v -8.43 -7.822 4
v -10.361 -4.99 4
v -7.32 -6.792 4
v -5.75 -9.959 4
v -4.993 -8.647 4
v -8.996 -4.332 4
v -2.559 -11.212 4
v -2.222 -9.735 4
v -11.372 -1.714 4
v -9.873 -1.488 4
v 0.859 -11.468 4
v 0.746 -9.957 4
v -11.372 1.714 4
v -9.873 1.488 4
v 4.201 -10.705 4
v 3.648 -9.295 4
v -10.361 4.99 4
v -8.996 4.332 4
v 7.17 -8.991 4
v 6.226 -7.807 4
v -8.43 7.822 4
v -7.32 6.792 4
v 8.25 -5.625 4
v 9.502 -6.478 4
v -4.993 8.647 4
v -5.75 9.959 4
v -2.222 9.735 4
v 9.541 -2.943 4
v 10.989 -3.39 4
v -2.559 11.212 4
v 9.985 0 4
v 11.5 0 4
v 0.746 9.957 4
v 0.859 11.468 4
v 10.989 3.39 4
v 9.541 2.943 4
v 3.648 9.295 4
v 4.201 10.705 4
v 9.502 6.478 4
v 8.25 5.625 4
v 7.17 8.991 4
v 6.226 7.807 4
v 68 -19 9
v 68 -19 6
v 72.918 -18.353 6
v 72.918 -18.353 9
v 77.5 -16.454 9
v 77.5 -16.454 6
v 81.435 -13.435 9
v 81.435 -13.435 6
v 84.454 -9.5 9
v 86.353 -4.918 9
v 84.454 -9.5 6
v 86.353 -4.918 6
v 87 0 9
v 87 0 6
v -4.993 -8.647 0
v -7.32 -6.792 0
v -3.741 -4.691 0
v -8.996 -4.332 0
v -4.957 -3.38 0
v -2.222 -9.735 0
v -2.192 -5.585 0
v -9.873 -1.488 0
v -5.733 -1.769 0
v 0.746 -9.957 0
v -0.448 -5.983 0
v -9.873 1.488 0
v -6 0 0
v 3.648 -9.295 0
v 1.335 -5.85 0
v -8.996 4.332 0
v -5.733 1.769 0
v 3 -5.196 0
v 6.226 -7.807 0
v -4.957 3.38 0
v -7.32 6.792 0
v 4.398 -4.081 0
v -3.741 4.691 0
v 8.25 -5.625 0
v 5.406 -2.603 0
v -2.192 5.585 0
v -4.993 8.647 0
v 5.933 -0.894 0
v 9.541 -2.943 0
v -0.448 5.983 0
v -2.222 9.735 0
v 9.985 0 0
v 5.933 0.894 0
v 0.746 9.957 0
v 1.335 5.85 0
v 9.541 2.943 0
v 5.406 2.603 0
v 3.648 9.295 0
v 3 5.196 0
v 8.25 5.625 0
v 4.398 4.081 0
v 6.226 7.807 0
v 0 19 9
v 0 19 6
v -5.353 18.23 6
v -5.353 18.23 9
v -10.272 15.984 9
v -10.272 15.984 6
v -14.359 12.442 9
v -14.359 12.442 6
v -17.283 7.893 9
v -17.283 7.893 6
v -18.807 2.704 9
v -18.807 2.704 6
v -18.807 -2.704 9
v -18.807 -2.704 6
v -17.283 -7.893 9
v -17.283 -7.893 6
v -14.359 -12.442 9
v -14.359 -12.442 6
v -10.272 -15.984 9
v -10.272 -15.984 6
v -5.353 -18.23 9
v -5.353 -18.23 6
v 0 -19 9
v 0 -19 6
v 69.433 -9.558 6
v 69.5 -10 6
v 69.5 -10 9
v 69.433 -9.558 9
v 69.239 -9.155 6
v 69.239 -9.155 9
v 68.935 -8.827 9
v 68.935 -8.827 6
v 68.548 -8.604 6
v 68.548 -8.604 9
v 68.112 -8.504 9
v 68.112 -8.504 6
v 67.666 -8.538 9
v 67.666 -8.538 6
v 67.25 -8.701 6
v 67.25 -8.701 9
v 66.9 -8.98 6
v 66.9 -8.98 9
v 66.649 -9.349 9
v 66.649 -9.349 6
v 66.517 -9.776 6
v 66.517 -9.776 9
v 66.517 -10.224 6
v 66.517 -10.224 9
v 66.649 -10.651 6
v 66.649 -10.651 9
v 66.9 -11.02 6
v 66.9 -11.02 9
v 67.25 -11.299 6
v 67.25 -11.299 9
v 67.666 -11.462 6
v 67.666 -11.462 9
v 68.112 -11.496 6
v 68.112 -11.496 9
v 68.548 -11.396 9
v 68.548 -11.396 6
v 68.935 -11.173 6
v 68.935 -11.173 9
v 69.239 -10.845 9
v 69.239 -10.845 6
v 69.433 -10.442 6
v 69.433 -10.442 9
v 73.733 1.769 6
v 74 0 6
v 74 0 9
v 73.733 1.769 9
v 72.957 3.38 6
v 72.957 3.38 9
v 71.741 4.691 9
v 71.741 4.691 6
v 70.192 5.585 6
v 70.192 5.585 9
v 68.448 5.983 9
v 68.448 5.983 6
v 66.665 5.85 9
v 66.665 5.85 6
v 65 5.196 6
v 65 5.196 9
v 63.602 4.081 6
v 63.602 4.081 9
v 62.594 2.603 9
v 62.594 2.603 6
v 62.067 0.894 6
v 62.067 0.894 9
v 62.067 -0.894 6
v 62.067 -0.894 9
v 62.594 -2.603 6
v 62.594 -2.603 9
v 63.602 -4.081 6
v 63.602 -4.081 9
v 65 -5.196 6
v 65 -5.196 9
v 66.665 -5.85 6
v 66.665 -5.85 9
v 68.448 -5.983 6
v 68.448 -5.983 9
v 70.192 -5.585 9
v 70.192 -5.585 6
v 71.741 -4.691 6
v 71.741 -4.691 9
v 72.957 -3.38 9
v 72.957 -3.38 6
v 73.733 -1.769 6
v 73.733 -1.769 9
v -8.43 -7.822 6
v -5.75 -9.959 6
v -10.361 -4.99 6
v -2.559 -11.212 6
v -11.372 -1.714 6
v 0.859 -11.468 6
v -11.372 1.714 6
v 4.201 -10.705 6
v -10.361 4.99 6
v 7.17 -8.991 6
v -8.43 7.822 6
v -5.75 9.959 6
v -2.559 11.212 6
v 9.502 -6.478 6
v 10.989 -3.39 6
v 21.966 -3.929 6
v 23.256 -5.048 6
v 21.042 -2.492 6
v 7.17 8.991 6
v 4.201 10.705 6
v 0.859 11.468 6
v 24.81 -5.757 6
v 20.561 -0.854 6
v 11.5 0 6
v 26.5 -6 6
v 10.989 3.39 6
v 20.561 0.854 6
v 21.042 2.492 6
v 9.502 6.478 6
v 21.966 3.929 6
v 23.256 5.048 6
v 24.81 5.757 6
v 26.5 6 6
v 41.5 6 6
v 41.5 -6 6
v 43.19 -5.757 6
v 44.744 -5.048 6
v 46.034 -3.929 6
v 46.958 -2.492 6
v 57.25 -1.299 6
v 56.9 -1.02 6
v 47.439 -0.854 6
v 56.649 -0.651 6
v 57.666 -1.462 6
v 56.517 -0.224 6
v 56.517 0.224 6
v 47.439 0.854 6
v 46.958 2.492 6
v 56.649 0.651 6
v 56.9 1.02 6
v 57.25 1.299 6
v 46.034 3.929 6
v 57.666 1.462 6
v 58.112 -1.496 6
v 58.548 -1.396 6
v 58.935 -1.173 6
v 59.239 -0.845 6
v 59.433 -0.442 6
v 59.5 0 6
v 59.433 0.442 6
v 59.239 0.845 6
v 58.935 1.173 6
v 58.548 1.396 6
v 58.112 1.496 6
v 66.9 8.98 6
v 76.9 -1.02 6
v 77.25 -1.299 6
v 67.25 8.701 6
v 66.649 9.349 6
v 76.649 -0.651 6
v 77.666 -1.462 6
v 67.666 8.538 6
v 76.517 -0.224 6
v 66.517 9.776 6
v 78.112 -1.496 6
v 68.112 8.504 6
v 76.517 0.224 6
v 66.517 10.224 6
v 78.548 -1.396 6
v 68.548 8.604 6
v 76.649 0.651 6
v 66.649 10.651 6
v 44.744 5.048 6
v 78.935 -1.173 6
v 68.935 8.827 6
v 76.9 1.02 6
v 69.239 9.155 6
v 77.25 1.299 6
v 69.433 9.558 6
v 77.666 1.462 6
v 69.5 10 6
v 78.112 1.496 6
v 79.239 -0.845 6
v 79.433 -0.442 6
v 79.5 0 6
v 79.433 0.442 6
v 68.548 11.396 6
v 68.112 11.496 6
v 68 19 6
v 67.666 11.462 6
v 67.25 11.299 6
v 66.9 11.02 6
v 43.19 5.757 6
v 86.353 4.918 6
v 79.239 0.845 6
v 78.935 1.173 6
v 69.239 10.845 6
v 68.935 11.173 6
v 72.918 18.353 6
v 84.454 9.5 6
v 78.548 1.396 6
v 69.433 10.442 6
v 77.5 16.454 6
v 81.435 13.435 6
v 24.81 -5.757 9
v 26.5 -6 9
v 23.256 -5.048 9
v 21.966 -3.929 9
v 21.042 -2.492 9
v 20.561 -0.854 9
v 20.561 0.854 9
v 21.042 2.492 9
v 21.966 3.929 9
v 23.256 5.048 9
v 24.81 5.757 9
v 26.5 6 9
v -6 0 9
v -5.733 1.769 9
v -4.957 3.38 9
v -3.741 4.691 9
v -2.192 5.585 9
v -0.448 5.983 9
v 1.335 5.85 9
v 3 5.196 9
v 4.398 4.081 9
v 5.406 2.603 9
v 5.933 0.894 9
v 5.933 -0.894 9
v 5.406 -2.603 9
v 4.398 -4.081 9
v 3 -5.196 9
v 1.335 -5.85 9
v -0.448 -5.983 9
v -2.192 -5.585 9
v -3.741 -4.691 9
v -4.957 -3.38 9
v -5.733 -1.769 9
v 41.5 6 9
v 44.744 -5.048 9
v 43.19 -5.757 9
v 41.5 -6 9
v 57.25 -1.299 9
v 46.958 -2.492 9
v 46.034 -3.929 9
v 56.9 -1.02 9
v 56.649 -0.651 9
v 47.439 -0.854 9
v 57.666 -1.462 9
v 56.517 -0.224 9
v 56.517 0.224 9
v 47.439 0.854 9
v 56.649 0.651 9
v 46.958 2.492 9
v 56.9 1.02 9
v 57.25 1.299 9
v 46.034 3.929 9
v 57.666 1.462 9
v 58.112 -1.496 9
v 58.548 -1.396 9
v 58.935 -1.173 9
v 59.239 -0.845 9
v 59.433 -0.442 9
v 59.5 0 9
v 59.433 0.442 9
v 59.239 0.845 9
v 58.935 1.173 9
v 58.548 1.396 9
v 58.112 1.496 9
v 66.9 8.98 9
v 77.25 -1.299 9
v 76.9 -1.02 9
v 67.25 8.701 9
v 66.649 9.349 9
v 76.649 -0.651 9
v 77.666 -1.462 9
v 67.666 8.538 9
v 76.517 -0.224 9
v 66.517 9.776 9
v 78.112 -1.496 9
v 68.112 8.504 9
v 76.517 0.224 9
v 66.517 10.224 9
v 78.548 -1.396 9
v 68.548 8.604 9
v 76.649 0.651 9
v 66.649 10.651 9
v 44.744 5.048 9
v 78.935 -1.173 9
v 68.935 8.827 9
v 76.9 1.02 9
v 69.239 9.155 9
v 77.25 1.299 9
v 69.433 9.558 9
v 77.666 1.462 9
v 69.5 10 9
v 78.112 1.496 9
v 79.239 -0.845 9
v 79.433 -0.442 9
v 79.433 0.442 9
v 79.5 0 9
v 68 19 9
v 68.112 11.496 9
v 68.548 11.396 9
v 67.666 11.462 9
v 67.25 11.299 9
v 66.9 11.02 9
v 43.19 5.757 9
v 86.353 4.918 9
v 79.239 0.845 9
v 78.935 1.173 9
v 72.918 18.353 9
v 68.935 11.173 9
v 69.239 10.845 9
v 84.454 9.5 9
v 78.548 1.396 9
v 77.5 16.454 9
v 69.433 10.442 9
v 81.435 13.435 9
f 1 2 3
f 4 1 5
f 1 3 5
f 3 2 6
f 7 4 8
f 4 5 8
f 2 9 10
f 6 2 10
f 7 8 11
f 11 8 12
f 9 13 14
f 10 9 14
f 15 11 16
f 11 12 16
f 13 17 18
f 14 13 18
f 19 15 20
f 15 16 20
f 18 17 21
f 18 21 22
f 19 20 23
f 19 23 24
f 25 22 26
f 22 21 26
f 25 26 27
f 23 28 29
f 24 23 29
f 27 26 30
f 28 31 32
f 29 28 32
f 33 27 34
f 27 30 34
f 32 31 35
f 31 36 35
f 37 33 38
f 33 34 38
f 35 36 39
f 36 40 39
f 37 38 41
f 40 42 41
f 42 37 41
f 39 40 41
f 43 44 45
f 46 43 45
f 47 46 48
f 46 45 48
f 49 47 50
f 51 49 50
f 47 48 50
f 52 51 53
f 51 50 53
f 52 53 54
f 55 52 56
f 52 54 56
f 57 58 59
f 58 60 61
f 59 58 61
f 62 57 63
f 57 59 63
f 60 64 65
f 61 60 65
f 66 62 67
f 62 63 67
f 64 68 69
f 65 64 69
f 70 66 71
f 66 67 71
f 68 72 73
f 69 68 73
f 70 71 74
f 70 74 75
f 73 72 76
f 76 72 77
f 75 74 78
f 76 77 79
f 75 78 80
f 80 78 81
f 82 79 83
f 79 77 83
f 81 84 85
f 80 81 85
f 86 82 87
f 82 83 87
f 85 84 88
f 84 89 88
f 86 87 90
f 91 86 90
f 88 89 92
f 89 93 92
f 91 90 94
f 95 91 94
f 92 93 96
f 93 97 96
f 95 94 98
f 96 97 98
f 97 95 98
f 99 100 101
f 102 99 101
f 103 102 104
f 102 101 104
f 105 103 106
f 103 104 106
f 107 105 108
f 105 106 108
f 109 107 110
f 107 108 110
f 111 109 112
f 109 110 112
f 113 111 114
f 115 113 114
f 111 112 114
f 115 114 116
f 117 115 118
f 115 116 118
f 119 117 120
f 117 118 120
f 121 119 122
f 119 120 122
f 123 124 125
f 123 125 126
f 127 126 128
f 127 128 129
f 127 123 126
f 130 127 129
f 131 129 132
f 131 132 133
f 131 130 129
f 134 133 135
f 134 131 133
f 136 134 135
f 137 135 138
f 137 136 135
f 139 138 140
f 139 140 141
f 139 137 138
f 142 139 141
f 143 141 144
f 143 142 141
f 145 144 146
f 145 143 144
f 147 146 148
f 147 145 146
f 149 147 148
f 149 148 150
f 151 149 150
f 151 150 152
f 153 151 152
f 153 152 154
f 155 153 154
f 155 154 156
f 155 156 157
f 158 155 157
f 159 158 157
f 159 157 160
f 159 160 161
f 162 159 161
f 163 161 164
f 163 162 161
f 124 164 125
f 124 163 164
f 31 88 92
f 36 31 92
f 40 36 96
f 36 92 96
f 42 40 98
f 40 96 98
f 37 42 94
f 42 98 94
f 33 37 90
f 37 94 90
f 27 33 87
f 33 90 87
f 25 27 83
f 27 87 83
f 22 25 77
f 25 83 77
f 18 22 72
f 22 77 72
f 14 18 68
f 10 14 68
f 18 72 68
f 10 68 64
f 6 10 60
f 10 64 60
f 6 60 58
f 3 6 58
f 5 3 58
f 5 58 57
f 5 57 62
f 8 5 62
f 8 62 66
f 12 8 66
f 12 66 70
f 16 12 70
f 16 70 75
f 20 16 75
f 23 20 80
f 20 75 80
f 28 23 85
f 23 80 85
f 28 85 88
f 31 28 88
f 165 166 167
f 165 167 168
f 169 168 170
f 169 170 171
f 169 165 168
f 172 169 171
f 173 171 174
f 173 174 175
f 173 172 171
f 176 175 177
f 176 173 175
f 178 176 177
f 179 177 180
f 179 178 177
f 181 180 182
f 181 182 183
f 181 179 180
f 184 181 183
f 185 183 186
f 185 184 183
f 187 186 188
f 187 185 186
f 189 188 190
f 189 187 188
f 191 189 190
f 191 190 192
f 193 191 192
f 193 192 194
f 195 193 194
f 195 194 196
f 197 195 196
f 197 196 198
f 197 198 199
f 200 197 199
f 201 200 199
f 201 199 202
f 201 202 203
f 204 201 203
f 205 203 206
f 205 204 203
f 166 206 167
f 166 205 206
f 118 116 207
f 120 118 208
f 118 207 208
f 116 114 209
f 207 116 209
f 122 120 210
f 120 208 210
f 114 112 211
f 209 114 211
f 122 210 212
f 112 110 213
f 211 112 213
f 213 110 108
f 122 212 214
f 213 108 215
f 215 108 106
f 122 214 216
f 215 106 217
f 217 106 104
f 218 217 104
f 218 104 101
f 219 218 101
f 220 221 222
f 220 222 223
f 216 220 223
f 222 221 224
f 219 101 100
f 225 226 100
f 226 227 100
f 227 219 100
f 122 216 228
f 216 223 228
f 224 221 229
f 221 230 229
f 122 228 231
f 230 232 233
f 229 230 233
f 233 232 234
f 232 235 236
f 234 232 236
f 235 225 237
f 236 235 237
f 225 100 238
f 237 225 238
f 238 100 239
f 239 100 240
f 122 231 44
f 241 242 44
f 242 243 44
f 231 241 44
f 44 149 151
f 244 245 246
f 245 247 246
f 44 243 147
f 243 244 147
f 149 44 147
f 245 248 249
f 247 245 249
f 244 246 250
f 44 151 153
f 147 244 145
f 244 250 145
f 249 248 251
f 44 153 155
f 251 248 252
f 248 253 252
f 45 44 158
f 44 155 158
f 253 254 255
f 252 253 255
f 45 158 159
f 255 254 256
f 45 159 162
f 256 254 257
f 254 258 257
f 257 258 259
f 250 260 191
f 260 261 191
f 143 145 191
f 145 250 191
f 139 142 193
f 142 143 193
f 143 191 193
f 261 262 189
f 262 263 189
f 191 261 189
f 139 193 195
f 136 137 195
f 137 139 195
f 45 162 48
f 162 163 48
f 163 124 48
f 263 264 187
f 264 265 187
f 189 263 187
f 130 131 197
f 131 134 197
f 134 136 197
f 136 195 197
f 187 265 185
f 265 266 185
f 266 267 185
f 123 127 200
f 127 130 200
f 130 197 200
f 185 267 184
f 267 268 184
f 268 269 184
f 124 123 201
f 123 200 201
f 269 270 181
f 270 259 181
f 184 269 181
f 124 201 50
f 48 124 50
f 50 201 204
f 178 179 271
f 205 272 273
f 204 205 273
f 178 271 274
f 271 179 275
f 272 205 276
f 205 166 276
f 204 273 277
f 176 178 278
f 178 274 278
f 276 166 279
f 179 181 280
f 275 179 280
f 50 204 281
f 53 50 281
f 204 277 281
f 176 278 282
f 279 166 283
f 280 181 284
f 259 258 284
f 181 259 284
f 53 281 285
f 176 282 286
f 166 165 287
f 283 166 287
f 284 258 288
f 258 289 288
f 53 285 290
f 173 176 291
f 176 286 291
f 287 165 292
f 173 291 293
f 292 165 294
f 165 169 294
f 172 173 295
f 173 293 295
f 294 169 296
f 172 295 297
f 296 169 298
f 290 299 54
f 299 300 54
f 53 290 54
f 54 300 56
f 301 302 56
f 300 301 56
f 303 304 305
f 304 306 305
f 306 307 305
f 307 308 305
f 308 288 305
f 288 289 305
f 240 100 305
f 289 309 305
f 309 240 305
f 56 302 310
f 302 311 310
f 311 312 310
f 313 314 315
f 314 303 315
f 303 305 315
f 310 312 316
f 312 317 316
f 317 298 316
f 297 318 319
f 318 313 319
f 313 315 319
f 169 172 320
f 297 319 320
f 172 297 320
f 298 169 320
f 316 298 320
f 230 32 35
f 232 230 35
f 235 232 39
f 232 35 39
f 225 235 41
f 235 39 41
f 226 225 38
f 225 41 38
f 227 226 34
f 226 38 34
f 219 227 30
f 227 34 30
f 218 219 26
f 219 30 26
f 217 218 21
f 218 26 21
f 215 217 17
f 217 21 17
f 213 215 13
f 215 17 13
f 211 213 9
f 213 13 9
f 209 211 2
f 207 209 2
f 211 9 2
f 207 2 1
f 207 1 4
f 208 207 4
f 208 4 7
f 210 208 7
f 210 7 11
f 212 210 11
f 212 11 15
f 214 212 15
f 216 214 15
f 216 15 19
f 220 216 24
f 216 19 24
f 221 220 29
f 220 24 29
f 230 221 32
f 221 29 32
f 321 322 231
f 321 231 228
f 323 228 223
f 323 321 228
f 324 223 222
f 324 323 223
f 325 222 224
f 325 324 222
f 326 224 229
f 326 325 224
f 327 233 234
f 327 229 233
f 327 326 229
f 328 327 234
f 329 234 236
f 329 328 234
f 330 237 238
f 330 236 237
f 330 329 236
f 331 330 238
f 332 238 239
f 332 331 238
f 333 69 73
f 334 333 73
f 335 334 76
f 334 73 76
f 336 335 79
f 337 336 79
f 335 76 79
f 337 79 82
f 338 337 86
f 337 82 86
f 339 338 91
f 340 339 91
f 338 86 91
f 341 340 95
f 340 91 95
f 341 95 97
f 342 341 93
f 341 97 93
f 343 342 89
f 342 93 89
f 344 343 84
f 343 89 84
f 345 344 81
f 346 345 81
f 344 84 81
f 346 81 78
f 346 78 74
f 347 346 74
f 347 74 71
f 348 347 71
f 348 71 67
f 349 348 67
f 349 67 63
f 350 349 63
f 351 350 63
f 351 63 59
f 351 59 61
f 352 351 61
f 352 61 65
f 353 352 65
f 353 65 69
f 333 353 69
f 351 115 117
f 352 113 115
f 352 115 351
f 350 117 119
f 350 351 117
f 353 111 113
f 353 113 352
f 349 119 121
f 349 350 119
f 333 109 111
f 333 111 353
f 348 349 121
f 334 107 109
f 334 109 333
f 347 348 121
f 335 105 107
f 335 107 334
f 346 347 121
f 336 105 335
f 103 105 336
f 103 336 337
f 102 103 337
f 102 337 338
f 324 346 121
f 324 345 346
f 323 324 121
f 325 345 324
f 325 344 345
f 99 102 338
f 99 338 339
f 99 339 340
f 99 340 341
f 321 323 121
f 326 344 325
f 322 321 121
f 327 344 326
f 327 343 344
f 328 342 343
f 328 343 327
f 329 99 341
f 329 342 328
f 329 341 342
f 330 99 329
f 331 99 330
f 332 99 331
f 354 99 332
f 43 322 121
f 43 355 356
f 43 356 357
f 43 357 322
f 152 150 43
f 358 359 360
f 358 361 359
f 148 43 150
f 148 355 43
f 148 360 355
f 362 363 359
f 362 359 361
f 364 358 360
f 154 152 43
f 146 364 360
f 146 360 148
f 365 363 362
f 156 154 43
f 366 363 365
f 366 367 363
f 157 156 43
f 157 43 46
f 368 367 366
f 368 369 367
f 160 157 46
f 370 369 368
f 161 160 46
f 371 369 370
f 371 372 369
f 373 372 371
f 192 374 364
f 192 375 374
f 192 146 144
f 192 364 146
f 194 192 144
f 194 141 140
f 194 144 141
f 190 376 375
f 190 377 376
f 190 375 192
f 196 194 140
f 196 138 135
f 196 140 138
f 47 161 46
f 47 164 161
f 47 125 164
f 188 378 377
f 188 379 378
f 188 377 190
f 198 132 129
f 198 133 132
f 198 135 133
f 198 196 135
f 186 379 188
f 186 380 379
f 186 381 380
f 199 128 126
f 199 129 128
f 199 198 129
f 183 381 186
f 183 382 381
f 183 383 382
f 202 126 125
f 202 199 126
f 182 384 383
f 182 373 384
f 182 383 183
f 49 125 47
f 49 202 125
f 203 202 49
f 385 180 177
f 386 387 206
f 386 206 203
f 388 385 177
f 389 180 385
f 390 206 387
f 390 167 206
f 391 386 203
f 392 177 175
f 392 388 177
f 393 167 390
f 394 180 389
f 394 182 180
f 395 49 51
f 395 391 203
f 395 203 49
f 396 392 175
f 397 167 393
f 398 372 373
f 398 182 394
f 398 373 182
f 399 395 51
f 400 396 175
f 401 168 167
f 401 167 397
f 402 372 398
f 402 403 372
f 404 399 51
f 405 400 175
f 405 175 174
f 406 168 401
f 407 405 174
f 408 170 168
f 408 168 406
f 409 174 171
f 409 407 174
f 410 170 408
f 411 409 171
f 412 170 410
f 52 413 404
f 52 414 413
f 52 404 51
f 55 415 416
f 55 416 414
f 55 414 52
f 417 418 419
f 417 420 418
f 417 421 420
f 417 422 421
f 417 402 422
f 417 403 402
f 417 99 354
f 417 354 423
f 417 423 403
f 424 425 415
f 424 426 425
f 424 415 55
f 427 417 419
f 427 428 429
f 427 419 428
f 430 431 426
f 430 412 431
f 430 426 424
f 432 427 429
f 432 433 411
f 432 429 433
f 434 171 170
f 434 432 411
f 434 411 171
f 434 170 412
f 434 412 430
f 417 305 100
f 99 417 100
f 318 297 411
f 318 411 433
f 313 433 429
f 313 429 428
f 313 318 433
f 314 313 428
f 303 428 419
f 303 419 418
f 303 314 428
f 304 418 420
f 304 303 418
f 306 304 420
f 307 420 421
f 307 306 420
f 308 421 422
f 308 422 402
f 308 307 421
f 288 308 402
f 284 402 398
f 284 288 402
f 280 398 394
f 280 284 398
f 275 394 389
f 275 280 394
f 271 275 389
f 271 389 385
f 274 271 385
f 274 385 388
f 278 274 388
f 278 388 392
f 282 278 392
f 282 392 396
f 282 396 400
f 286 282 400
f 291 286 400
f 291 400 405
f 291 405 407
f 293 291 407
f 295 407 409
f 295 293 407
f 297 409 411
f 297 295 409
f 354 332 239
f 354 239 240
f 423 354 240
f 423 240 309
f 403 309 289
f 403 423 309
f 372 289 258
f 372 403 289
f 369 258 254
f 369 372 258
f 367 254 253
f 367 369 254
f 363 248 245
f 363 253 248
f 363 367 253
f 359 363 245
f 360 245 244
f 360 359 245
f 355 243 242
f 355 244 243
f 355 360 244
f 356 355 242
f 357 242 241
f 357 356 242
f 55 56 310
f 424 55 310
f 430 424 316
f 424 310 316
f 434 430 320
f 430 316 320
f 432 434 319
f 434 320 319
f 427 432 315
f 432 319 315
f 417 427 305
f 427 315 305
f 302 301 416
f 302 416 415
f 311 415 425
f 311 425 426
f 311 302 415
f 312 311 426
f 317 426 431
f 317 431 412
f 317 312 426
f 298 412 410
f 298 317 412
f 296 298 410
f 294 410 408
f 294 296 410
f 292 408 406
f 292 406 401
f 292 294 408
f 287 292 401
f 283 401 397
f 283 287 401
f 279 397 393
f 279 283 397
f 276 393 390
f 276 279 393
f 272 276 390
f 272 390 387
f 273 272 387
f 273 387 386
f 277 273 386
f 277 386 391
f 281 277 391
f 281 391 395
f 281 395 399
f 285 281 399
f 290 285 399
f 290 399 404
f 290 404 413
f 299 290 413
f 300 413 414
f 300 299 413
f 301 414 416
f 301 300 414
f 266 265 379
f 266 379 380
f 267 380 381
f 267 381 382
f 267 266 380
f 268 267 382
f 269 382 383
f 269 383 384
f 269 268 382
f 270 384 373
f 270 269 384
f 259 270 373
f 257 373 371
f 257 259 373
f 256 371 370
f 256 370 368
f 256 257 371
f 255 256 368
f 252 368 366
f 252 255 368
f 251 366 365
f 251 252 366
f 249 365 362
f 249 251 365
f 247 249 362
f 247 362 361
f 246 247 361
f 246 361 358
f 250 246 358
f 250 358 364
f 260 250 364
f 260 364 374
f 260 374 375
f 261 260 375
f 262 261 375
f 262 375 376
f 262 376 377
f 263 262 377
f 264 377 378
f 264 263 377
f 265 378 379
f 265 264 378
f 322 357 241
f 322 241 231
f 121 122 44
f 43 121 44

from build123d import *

# Parameters (mm, degrees)
SKETCH_1_R          = 9.985
EXTRUDE_1_DEPTH     = 4
SKETCH_2_R          = 11.5
EXTRUDE_2_DEPTH     = 2
SKETCH_3_R          = 19
EXTRUDE_3_DEPTH     = 3
SKETCH_4_R          = 6
CUT_EXTRUDE_1_DEPTH = 29.337254631
EXTRUDE_START       = -3
SKETCH_5_R          = 1.5
SKETCH_5_R_2        = 6
EXTRUDE_4_DEPTH     = 3
SKETCH_6_R          = 6
CUT_EXTRUDE_2_DEPTH = 90.504189846


with BuildPart() as part:
    # 草图1 → 凸台-拉伸1 (new body)
    with BuildSketch(Plane.XY):
        Circle(SKETCH_1_R)
    extrude(amount=EXTRUDE_1_DEPTH)

    # 草图2 → 凸台-拉伸2 (add)
    with BuildSketch(Plane.XY.offset(4)):
        Circle(SKETCH_2_R)
    extrude(amount=EXTRUDE_2_DEPTH)

    # 草图3 → 凸台-拉伸3 (add)
    with BuildSketch(Plane.XY.offset(6)):
        Circle(SKETCH_3_R)
    extrude(amount=EXTRUDE_3_DEPTH)

    # 草图4 → 切除-拉伸1 (cut, through all)
    with BuildSketch(Plane(origin=(0, 0, 0), x_dir=(-1, 0, 0), z_dir=(0, 0, -1))):
        Circle(SKETCH_4_R)
    extrude(amount=-CUT_EXTRUDE_1_DEPTH, mode=Mode.SUBTRACT)

    # 草图5 → 凸台-拉伸4 (add)
    # profile 1 of 2: a face of its own
    with BuildSketch(Plane.XY.offset(9).offset(EXTRUDE_START)):
        with BuildLine():
            Line((68, 19), (0, 19))
            ThreePointArc((0, 19), (13.435028843, 13.435028843), (19, 0))
            ThreePointArc((19, 0), (13.435028843, -13.435028843), (0, -19))
            Line((0, -19), (68, -19))
            ThreePointArc((68, -19), (49, 0), (68, 19))
        make_face()
    # profile 2 of 2: a face of its own
    with BuildSketch(Plane.XY.offset(9).offset(EXTRUDE_START)):
        with BuildLine():
            ThreePointArc((87, 0), (81.435028843, 13.435028843), (68, 19))
            ThreePointArc((68, 19), (49, 0), (68, -19))
            ThreePointArc((68, -19), (81.435028843, -13.435028843), (87, 0))
        make_face()
        with Locations((68, -10)):
            Circle(SKETCH_5_R, mode=Mode.SUBTRACT)
        with Locations((58, 0)):
            Circle(SKETCH_5_R, mode=Mode.SUBTRACT)
        with Locations((68, 0)):
            Circle(SKETCH_5_R_2, mode=Mode.SUBTRACT)
        with Locations((78, 0)):
            Circle(SKETCH_5_R, mode=Mode.SUBTRACT)
        with Locations((68, 10)):
            Circle(SKETCH_5_R, mode=Mode.SUBTRACT)
    extrude(amount=EXTRUDE_4_DEPTH)

    # 草图6 → 切除-拉伸2 (cut, through all)
    with BuildSketch(Plane.XY.offset(9)):
        with Locations((68, 0)):
            Circle(SKETCH_6_R)
        with BuildLine():
            Line((26.5, 6), (41.5, 6))
            ThreePointArc((41.5, 6), (47.5, 0), (41.5, -6))
            Line((41.5, -6), (26.5, -6))
            ThreePointArc((26.5, -6), (20.5, 0), (26.5, 6))
        make_face()
    extrude(amount=-CUT_EXTRUDE_2_DEPTH, mode=Mode.SUBTRACT)


solid = part.part
